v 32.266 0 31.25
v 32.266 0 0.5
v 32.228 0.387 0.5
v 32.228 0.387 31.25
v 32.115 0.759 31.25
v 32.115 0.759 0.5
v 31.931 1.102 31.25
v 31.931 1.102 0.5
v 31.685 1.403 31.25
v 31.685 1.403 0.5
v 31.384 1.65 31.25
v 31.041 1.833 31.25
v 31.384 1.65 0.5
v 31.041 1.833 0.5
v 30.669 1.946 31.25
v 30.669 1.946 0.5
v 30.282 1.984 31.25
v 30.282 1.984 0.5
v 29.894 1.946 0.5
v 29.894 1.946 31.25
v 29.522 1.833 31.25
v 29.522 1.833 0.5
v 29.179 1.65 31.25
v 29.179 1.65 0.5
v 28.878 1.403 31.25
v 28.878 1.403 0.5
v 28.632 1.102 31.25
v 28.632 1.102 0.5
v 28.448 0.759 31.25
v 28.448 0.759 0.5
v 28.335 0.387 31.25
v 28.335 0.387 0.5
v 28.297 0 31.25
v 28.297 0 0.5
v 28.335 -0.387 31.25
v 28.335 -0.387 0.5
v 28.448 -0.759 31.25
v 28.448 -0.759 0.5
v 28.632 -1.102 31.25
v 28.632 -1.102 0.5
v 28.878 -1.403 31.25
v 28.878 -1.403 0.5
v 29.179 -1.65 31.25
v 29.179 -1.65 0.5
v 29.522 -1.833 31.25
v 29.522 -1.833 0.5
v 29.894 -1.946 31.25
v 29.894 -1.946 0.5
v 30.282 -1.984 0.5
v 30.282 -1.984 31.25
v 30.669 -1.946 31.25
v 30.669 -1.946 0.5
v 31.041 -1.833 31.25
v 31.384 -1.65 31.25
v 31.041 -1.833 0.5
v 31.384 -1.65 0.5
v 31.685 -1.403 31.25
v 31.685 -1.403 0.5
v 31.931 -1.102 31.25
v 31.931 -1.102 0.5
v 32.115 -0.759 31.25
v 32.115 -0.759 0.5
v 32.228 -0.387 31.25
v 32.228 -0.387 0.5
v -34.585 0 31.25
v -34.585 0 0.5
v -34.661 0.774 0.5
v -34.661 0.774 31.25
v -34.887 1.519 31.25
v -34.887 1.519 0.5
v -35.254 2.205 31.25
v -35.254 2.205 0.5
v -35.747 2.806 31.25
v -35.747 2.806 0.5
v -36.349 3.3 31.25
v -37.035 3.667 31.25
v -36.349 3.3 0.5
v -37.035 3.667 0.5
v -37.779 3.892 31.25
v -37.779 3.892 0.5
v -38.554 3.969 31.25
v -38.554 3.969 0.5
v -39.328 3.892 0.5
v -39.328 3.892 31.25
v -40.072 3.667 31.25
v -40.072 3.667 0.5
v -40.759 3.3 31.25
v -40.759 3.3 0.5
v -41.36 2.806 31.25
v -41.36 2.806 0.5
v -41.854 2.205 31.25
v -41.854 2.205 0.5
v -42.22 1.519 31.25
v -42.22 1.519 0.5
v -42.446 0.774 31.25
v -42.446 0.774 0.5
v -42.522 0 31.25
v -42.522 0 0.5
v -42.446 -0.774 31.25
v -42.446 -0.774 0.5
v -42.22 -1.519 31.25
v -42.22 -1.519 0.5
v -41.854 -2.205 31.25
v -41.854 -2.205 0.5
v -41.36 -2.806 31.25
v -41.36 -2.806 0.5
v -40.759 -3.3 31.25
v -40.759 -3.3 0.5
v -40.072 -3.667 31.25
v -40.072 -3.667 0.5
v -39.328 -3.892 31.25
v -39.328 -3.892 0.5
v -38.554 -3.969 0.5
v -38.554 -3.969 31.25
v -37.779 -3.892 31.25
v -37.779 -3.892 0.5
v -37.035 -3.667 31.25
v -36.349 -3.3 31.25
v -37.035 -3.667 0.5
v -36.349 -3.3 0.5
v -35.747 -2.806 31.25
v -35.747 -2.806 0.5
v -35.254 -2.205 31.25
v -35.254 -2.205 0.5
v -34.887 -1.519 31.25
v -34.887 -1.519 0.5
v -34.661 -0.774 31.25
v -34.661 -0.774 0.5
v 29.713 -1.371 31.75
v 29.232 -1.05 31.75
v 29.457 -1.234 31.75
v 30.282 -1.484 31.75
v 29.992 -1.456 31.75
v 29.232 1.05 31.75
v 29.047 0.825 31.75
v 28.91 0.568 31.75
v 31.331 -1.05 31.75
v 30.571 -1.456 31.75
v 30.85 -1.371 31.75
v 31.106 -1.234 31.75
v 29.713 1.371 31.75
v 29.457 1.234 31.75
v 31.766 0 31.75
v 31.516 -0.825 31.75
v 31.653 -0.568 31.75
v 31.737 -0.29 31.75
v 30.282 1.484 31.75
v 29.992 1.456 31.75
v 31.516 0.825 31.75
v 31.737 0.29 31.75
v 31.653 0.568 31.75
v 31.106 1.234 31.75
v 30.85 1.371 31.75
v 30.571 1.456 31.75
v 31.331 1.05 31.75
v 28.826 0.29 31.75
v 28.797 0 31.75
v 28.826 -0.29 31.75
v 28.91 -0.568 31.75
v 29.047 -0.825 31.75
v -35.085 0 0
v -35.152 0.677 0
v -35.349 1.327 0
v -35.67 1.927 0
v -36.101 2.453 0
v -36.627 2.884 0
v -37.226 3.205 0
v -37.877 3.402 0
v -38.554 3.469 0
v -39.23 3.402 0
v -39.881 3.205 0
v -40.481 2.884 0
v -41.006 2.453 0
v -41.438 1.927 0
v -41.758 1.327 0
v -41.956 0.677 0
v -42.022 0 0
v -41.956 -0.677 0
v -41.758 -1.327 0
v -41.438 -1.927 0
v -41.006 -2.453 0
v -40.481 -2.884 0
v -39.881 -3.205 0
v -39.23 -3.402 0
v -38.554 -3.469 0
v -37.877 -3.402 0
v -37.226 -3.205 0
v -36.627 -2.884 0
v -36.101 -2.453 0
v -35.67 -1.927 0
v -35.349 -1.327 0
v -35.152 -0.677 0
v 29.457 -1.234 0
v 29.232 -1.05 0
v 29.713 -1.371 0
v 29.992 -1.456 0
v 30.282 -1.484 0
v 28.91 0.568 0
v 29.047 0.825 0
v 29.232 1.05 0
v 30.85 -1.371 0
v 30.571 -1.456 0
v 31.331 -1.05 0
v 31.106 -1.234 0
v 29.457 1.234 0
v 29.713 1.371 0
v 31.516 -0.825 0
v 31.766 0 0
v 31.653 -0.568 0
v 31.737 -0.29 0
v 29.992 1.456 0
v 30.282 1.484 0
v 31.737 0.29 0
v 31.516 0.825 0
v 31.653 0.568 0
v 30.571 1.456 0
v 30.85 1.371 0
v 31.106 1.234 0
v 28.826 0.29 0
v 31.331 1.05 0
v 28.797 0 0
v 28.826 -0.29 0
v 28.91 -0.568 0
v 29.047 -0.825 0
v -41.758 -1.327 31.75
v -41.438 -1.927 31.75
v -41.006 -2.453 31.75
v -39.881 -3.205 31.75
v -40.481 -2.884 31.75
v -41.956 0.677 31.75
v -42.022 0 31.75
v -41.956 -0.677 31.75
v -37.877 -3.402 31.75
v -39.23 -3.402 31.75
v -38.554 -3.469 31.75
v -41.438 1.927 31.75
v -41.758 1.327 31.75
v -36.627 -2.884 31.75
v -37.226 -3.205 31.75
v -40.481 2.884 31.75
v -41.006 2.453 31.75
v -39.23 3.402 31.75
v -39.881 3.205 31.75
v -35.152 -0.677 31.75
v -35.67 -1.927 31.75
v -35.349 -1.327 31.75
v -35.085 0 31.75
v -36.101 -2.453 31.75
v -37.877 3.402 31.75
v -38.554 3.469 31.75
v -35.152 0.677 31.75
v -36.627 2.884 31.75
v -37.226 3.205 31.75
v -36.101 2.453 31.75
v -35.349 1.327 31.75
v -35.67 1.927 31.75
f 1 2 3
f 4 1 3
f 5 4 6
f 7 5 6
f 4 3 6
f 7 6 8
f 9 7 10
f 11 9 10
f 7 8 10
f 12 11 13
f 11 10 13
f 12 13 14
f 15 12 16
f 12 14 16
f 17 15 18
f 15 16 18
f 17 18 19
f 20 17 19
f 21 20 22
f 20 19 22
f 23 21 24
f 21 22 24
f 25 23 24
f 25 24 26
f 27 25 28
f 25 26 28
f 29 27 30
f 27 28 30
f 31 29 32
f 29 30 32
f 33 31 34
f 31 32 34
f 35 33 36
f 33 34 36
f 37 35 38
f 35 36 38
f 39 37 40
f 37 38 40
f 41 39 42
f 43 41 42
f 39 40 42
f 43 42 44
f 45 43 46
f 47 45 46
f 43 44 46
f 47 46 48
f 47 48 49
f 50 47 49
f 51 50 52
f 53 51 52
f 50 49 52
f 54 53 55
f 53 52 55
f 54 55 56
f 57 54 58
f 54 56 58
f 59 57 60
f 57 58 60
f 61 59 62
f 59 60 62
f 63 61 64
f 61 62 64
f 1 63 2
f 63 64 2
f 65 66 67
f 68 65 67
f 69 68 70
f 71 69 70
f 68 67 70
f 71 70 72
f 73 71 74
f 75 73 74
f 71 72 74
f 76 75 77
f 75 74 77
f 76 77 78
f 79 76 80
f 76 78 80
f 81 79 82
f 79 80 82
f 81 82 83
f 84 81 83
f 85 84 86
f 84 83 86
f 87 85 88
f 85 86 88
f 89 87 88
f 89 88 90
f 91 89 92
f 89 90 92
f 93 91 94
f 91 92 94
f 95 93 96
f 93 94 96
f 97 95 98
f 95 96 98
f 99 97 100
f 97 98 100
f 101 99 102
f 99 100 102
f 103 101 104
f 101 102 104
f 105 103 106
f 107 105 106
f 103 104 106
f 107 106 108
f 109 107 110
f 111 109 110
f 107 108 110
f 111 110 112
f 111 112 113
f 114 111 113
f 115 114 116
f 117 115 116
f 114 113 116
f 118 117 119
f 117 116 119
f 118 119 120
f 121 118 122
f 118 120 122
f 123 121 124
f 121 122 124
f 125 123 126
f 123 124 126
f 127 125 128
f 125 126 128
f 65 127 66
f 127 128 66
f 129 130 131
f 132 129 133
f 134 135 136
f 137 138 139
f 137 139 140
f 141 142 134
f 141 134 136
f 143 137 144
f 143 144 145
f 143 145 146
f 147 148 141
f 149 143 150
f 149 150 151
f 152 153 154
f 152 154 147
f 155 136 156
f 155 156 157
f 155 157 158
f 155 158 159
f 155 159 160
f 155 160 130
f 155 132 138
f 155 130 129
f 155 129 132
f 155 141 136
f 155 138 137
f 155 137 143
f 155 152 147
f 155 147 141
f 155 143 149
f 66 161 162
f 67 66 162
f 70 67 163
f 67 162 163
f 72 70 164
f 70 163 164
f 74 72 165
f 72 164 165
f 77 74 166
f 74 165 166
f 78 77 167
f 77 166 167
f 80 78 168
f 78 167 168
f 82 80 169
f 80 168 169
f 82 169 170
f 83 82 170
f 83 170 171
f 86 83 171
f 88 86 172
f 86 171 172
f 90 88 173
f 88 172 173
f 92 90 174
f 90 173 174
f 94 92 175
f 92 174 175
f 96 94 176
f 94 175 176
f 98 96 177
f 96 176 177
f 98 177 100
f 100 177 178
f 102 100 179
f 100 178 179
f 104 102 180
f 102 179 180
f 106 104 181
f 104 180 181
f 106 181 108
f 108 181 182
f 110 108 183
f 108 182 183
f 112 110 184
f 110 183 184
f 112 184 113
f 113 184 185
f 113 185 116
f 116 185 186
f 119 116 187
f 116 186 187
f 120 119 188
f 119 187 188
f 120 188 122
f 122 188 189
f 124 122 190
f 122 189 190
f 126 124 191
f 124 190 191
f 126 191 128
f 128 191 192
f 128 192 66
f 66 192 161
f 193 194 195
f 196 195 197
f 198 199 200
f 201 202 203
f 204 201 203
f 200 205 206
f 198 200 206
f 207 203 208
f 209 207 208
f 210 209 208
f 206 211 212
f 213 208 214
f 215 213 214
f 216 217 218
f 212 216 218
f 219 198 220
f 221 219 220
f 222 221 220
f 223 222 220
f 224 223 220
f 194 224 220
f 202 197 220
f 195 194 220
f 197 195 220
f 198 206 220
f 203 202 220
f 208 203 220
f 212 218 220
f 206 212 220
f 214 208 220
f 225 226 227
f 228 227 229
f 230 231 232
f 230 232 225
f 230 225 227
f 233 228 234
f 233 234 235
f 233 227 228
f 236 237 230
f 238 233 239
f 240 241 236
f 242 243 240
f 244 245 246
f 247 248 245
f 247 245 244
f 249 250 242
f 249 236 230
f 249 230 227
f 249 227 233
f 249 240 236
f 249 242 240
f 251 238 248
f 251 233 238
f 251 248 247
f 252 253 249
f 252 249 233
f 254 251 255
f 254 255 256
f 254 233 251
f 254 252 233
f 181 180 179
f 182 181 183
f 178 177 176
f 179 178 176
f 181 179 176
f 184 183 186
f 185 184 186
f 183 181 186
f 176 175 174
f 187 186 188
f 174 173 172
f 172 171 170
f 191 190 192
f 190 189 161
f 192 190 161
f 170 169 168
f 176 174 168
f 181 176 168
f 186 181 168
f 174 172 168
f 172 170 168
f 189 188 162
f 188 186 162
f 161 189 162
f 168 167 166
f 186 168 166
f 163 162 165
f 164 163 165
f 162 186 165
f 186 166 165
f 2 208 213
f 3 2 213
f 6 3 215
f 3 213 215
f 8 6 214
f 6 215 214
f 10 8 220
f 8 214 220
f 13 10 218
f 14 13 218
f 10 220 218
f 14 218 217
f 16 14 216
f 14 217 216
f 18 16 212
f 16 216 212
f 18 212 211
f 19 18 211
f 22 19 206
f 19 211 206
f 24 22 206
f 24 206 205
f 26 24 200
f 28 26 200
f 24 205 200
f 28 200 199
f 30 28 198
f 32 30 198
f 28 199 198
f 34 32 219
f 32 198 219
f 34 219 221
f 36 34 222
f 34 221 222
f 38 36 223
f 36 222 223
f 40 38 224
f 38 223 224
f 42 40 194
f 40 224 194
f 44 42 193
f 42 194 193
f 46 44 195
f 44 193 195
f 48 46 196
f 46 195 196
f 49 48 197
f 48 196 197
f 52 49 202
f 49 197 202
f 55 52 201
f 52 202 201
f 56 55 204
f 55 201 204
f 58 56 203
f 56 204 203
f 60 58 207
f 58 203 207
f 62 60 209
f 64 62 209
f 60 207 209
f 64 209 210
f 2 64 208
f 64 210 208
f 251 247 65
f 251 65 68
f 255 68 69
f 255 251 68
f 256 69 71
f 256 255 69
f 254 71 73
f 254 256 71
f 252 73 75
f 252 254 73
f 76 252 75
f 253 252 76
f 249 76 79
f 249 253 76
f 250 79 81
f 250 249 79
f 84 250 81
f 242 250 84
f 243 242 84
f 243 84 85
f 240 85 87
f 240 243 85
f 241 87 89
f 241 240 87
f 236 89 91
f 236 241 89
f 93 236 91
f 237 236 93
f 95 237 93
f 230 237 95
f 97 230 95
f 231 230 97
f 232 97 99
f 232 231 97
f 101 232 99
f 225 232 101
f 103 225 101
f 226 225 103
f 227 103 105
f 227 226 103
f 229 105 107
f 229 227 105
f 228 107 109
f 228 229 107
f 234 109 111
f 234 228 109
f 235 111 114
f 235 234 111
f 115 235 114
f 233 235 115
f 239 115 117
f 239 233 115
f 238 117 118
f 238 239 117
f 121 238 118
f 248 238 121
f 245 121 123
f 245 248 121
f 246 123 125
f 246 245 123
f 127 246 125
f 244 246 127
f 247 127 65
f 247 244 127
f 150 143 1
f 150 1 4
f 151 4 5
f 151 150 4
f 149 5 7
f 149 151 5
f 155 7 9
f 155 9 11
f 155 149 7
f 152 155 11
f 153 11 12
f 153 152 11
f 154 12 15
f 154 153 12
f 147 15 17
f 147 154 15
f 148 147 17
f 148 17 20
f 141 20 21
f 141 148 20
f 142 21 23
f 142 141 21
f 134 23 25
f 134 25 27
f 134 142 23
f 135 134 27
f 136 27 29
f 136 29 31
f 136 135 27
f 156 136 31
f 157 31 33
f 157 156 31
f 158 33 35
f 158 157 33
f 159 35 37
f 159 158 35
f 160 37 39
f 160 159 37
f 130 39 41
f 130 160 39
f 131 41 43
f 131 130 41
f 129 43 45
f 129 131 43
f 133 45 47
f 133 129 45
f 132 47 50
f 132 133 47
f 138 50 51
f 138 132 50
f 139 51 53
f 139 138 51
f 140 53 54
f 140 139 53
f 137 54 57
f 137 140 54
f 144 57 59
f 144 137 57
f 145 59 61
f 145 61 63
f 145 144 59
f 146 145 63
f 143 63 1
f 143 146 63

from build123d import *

# Parameters (mm, degrees)
F0_R      = 3.96875
F1_DEPTH  = 31.75
F0_R_2    = 1.984375
F2_DEPTH  = 31.75
F3_SIZE   = 0.5
F3_2_SIZE = 0.5


with BuildPart() as f1:
    # F0 (on Top) → F1 (new body)
    with BuildSketch(Plane.XY):
        with Locations((-38.553708, 0)):
            Circle(F0_R)
    extrude(amount=F1_DEPTH)

    # F3
    f3_edges = [f1.edges().sort_by_distance(p)[0] for p in [
        (-42.522458, 0, 31.75),
        (-42.522458, 0, 0),
    ]]
    chamfer(f3_edges, length=F3_SIZE)


with BuildPart() as f2:
    # F0 (on Top) → F2 (new body)
    with BuildSketch(Plane.XY):
        with Locations((30.281539, 0)):
            Circle(F0_R_2)
    extrude(amount=F2_DEPTH)

    # F3#2
    f3_2_edges = [f2.edges().sort_by_distance(p)[0] for p in [
        (28.297164, 0, 31.75),
        (28.297164, 0, 0),
    ]]
    chamfer(f3_2_edges, length=F3_2_SIZE)


solid = Compound([f1.part, f2.part])
